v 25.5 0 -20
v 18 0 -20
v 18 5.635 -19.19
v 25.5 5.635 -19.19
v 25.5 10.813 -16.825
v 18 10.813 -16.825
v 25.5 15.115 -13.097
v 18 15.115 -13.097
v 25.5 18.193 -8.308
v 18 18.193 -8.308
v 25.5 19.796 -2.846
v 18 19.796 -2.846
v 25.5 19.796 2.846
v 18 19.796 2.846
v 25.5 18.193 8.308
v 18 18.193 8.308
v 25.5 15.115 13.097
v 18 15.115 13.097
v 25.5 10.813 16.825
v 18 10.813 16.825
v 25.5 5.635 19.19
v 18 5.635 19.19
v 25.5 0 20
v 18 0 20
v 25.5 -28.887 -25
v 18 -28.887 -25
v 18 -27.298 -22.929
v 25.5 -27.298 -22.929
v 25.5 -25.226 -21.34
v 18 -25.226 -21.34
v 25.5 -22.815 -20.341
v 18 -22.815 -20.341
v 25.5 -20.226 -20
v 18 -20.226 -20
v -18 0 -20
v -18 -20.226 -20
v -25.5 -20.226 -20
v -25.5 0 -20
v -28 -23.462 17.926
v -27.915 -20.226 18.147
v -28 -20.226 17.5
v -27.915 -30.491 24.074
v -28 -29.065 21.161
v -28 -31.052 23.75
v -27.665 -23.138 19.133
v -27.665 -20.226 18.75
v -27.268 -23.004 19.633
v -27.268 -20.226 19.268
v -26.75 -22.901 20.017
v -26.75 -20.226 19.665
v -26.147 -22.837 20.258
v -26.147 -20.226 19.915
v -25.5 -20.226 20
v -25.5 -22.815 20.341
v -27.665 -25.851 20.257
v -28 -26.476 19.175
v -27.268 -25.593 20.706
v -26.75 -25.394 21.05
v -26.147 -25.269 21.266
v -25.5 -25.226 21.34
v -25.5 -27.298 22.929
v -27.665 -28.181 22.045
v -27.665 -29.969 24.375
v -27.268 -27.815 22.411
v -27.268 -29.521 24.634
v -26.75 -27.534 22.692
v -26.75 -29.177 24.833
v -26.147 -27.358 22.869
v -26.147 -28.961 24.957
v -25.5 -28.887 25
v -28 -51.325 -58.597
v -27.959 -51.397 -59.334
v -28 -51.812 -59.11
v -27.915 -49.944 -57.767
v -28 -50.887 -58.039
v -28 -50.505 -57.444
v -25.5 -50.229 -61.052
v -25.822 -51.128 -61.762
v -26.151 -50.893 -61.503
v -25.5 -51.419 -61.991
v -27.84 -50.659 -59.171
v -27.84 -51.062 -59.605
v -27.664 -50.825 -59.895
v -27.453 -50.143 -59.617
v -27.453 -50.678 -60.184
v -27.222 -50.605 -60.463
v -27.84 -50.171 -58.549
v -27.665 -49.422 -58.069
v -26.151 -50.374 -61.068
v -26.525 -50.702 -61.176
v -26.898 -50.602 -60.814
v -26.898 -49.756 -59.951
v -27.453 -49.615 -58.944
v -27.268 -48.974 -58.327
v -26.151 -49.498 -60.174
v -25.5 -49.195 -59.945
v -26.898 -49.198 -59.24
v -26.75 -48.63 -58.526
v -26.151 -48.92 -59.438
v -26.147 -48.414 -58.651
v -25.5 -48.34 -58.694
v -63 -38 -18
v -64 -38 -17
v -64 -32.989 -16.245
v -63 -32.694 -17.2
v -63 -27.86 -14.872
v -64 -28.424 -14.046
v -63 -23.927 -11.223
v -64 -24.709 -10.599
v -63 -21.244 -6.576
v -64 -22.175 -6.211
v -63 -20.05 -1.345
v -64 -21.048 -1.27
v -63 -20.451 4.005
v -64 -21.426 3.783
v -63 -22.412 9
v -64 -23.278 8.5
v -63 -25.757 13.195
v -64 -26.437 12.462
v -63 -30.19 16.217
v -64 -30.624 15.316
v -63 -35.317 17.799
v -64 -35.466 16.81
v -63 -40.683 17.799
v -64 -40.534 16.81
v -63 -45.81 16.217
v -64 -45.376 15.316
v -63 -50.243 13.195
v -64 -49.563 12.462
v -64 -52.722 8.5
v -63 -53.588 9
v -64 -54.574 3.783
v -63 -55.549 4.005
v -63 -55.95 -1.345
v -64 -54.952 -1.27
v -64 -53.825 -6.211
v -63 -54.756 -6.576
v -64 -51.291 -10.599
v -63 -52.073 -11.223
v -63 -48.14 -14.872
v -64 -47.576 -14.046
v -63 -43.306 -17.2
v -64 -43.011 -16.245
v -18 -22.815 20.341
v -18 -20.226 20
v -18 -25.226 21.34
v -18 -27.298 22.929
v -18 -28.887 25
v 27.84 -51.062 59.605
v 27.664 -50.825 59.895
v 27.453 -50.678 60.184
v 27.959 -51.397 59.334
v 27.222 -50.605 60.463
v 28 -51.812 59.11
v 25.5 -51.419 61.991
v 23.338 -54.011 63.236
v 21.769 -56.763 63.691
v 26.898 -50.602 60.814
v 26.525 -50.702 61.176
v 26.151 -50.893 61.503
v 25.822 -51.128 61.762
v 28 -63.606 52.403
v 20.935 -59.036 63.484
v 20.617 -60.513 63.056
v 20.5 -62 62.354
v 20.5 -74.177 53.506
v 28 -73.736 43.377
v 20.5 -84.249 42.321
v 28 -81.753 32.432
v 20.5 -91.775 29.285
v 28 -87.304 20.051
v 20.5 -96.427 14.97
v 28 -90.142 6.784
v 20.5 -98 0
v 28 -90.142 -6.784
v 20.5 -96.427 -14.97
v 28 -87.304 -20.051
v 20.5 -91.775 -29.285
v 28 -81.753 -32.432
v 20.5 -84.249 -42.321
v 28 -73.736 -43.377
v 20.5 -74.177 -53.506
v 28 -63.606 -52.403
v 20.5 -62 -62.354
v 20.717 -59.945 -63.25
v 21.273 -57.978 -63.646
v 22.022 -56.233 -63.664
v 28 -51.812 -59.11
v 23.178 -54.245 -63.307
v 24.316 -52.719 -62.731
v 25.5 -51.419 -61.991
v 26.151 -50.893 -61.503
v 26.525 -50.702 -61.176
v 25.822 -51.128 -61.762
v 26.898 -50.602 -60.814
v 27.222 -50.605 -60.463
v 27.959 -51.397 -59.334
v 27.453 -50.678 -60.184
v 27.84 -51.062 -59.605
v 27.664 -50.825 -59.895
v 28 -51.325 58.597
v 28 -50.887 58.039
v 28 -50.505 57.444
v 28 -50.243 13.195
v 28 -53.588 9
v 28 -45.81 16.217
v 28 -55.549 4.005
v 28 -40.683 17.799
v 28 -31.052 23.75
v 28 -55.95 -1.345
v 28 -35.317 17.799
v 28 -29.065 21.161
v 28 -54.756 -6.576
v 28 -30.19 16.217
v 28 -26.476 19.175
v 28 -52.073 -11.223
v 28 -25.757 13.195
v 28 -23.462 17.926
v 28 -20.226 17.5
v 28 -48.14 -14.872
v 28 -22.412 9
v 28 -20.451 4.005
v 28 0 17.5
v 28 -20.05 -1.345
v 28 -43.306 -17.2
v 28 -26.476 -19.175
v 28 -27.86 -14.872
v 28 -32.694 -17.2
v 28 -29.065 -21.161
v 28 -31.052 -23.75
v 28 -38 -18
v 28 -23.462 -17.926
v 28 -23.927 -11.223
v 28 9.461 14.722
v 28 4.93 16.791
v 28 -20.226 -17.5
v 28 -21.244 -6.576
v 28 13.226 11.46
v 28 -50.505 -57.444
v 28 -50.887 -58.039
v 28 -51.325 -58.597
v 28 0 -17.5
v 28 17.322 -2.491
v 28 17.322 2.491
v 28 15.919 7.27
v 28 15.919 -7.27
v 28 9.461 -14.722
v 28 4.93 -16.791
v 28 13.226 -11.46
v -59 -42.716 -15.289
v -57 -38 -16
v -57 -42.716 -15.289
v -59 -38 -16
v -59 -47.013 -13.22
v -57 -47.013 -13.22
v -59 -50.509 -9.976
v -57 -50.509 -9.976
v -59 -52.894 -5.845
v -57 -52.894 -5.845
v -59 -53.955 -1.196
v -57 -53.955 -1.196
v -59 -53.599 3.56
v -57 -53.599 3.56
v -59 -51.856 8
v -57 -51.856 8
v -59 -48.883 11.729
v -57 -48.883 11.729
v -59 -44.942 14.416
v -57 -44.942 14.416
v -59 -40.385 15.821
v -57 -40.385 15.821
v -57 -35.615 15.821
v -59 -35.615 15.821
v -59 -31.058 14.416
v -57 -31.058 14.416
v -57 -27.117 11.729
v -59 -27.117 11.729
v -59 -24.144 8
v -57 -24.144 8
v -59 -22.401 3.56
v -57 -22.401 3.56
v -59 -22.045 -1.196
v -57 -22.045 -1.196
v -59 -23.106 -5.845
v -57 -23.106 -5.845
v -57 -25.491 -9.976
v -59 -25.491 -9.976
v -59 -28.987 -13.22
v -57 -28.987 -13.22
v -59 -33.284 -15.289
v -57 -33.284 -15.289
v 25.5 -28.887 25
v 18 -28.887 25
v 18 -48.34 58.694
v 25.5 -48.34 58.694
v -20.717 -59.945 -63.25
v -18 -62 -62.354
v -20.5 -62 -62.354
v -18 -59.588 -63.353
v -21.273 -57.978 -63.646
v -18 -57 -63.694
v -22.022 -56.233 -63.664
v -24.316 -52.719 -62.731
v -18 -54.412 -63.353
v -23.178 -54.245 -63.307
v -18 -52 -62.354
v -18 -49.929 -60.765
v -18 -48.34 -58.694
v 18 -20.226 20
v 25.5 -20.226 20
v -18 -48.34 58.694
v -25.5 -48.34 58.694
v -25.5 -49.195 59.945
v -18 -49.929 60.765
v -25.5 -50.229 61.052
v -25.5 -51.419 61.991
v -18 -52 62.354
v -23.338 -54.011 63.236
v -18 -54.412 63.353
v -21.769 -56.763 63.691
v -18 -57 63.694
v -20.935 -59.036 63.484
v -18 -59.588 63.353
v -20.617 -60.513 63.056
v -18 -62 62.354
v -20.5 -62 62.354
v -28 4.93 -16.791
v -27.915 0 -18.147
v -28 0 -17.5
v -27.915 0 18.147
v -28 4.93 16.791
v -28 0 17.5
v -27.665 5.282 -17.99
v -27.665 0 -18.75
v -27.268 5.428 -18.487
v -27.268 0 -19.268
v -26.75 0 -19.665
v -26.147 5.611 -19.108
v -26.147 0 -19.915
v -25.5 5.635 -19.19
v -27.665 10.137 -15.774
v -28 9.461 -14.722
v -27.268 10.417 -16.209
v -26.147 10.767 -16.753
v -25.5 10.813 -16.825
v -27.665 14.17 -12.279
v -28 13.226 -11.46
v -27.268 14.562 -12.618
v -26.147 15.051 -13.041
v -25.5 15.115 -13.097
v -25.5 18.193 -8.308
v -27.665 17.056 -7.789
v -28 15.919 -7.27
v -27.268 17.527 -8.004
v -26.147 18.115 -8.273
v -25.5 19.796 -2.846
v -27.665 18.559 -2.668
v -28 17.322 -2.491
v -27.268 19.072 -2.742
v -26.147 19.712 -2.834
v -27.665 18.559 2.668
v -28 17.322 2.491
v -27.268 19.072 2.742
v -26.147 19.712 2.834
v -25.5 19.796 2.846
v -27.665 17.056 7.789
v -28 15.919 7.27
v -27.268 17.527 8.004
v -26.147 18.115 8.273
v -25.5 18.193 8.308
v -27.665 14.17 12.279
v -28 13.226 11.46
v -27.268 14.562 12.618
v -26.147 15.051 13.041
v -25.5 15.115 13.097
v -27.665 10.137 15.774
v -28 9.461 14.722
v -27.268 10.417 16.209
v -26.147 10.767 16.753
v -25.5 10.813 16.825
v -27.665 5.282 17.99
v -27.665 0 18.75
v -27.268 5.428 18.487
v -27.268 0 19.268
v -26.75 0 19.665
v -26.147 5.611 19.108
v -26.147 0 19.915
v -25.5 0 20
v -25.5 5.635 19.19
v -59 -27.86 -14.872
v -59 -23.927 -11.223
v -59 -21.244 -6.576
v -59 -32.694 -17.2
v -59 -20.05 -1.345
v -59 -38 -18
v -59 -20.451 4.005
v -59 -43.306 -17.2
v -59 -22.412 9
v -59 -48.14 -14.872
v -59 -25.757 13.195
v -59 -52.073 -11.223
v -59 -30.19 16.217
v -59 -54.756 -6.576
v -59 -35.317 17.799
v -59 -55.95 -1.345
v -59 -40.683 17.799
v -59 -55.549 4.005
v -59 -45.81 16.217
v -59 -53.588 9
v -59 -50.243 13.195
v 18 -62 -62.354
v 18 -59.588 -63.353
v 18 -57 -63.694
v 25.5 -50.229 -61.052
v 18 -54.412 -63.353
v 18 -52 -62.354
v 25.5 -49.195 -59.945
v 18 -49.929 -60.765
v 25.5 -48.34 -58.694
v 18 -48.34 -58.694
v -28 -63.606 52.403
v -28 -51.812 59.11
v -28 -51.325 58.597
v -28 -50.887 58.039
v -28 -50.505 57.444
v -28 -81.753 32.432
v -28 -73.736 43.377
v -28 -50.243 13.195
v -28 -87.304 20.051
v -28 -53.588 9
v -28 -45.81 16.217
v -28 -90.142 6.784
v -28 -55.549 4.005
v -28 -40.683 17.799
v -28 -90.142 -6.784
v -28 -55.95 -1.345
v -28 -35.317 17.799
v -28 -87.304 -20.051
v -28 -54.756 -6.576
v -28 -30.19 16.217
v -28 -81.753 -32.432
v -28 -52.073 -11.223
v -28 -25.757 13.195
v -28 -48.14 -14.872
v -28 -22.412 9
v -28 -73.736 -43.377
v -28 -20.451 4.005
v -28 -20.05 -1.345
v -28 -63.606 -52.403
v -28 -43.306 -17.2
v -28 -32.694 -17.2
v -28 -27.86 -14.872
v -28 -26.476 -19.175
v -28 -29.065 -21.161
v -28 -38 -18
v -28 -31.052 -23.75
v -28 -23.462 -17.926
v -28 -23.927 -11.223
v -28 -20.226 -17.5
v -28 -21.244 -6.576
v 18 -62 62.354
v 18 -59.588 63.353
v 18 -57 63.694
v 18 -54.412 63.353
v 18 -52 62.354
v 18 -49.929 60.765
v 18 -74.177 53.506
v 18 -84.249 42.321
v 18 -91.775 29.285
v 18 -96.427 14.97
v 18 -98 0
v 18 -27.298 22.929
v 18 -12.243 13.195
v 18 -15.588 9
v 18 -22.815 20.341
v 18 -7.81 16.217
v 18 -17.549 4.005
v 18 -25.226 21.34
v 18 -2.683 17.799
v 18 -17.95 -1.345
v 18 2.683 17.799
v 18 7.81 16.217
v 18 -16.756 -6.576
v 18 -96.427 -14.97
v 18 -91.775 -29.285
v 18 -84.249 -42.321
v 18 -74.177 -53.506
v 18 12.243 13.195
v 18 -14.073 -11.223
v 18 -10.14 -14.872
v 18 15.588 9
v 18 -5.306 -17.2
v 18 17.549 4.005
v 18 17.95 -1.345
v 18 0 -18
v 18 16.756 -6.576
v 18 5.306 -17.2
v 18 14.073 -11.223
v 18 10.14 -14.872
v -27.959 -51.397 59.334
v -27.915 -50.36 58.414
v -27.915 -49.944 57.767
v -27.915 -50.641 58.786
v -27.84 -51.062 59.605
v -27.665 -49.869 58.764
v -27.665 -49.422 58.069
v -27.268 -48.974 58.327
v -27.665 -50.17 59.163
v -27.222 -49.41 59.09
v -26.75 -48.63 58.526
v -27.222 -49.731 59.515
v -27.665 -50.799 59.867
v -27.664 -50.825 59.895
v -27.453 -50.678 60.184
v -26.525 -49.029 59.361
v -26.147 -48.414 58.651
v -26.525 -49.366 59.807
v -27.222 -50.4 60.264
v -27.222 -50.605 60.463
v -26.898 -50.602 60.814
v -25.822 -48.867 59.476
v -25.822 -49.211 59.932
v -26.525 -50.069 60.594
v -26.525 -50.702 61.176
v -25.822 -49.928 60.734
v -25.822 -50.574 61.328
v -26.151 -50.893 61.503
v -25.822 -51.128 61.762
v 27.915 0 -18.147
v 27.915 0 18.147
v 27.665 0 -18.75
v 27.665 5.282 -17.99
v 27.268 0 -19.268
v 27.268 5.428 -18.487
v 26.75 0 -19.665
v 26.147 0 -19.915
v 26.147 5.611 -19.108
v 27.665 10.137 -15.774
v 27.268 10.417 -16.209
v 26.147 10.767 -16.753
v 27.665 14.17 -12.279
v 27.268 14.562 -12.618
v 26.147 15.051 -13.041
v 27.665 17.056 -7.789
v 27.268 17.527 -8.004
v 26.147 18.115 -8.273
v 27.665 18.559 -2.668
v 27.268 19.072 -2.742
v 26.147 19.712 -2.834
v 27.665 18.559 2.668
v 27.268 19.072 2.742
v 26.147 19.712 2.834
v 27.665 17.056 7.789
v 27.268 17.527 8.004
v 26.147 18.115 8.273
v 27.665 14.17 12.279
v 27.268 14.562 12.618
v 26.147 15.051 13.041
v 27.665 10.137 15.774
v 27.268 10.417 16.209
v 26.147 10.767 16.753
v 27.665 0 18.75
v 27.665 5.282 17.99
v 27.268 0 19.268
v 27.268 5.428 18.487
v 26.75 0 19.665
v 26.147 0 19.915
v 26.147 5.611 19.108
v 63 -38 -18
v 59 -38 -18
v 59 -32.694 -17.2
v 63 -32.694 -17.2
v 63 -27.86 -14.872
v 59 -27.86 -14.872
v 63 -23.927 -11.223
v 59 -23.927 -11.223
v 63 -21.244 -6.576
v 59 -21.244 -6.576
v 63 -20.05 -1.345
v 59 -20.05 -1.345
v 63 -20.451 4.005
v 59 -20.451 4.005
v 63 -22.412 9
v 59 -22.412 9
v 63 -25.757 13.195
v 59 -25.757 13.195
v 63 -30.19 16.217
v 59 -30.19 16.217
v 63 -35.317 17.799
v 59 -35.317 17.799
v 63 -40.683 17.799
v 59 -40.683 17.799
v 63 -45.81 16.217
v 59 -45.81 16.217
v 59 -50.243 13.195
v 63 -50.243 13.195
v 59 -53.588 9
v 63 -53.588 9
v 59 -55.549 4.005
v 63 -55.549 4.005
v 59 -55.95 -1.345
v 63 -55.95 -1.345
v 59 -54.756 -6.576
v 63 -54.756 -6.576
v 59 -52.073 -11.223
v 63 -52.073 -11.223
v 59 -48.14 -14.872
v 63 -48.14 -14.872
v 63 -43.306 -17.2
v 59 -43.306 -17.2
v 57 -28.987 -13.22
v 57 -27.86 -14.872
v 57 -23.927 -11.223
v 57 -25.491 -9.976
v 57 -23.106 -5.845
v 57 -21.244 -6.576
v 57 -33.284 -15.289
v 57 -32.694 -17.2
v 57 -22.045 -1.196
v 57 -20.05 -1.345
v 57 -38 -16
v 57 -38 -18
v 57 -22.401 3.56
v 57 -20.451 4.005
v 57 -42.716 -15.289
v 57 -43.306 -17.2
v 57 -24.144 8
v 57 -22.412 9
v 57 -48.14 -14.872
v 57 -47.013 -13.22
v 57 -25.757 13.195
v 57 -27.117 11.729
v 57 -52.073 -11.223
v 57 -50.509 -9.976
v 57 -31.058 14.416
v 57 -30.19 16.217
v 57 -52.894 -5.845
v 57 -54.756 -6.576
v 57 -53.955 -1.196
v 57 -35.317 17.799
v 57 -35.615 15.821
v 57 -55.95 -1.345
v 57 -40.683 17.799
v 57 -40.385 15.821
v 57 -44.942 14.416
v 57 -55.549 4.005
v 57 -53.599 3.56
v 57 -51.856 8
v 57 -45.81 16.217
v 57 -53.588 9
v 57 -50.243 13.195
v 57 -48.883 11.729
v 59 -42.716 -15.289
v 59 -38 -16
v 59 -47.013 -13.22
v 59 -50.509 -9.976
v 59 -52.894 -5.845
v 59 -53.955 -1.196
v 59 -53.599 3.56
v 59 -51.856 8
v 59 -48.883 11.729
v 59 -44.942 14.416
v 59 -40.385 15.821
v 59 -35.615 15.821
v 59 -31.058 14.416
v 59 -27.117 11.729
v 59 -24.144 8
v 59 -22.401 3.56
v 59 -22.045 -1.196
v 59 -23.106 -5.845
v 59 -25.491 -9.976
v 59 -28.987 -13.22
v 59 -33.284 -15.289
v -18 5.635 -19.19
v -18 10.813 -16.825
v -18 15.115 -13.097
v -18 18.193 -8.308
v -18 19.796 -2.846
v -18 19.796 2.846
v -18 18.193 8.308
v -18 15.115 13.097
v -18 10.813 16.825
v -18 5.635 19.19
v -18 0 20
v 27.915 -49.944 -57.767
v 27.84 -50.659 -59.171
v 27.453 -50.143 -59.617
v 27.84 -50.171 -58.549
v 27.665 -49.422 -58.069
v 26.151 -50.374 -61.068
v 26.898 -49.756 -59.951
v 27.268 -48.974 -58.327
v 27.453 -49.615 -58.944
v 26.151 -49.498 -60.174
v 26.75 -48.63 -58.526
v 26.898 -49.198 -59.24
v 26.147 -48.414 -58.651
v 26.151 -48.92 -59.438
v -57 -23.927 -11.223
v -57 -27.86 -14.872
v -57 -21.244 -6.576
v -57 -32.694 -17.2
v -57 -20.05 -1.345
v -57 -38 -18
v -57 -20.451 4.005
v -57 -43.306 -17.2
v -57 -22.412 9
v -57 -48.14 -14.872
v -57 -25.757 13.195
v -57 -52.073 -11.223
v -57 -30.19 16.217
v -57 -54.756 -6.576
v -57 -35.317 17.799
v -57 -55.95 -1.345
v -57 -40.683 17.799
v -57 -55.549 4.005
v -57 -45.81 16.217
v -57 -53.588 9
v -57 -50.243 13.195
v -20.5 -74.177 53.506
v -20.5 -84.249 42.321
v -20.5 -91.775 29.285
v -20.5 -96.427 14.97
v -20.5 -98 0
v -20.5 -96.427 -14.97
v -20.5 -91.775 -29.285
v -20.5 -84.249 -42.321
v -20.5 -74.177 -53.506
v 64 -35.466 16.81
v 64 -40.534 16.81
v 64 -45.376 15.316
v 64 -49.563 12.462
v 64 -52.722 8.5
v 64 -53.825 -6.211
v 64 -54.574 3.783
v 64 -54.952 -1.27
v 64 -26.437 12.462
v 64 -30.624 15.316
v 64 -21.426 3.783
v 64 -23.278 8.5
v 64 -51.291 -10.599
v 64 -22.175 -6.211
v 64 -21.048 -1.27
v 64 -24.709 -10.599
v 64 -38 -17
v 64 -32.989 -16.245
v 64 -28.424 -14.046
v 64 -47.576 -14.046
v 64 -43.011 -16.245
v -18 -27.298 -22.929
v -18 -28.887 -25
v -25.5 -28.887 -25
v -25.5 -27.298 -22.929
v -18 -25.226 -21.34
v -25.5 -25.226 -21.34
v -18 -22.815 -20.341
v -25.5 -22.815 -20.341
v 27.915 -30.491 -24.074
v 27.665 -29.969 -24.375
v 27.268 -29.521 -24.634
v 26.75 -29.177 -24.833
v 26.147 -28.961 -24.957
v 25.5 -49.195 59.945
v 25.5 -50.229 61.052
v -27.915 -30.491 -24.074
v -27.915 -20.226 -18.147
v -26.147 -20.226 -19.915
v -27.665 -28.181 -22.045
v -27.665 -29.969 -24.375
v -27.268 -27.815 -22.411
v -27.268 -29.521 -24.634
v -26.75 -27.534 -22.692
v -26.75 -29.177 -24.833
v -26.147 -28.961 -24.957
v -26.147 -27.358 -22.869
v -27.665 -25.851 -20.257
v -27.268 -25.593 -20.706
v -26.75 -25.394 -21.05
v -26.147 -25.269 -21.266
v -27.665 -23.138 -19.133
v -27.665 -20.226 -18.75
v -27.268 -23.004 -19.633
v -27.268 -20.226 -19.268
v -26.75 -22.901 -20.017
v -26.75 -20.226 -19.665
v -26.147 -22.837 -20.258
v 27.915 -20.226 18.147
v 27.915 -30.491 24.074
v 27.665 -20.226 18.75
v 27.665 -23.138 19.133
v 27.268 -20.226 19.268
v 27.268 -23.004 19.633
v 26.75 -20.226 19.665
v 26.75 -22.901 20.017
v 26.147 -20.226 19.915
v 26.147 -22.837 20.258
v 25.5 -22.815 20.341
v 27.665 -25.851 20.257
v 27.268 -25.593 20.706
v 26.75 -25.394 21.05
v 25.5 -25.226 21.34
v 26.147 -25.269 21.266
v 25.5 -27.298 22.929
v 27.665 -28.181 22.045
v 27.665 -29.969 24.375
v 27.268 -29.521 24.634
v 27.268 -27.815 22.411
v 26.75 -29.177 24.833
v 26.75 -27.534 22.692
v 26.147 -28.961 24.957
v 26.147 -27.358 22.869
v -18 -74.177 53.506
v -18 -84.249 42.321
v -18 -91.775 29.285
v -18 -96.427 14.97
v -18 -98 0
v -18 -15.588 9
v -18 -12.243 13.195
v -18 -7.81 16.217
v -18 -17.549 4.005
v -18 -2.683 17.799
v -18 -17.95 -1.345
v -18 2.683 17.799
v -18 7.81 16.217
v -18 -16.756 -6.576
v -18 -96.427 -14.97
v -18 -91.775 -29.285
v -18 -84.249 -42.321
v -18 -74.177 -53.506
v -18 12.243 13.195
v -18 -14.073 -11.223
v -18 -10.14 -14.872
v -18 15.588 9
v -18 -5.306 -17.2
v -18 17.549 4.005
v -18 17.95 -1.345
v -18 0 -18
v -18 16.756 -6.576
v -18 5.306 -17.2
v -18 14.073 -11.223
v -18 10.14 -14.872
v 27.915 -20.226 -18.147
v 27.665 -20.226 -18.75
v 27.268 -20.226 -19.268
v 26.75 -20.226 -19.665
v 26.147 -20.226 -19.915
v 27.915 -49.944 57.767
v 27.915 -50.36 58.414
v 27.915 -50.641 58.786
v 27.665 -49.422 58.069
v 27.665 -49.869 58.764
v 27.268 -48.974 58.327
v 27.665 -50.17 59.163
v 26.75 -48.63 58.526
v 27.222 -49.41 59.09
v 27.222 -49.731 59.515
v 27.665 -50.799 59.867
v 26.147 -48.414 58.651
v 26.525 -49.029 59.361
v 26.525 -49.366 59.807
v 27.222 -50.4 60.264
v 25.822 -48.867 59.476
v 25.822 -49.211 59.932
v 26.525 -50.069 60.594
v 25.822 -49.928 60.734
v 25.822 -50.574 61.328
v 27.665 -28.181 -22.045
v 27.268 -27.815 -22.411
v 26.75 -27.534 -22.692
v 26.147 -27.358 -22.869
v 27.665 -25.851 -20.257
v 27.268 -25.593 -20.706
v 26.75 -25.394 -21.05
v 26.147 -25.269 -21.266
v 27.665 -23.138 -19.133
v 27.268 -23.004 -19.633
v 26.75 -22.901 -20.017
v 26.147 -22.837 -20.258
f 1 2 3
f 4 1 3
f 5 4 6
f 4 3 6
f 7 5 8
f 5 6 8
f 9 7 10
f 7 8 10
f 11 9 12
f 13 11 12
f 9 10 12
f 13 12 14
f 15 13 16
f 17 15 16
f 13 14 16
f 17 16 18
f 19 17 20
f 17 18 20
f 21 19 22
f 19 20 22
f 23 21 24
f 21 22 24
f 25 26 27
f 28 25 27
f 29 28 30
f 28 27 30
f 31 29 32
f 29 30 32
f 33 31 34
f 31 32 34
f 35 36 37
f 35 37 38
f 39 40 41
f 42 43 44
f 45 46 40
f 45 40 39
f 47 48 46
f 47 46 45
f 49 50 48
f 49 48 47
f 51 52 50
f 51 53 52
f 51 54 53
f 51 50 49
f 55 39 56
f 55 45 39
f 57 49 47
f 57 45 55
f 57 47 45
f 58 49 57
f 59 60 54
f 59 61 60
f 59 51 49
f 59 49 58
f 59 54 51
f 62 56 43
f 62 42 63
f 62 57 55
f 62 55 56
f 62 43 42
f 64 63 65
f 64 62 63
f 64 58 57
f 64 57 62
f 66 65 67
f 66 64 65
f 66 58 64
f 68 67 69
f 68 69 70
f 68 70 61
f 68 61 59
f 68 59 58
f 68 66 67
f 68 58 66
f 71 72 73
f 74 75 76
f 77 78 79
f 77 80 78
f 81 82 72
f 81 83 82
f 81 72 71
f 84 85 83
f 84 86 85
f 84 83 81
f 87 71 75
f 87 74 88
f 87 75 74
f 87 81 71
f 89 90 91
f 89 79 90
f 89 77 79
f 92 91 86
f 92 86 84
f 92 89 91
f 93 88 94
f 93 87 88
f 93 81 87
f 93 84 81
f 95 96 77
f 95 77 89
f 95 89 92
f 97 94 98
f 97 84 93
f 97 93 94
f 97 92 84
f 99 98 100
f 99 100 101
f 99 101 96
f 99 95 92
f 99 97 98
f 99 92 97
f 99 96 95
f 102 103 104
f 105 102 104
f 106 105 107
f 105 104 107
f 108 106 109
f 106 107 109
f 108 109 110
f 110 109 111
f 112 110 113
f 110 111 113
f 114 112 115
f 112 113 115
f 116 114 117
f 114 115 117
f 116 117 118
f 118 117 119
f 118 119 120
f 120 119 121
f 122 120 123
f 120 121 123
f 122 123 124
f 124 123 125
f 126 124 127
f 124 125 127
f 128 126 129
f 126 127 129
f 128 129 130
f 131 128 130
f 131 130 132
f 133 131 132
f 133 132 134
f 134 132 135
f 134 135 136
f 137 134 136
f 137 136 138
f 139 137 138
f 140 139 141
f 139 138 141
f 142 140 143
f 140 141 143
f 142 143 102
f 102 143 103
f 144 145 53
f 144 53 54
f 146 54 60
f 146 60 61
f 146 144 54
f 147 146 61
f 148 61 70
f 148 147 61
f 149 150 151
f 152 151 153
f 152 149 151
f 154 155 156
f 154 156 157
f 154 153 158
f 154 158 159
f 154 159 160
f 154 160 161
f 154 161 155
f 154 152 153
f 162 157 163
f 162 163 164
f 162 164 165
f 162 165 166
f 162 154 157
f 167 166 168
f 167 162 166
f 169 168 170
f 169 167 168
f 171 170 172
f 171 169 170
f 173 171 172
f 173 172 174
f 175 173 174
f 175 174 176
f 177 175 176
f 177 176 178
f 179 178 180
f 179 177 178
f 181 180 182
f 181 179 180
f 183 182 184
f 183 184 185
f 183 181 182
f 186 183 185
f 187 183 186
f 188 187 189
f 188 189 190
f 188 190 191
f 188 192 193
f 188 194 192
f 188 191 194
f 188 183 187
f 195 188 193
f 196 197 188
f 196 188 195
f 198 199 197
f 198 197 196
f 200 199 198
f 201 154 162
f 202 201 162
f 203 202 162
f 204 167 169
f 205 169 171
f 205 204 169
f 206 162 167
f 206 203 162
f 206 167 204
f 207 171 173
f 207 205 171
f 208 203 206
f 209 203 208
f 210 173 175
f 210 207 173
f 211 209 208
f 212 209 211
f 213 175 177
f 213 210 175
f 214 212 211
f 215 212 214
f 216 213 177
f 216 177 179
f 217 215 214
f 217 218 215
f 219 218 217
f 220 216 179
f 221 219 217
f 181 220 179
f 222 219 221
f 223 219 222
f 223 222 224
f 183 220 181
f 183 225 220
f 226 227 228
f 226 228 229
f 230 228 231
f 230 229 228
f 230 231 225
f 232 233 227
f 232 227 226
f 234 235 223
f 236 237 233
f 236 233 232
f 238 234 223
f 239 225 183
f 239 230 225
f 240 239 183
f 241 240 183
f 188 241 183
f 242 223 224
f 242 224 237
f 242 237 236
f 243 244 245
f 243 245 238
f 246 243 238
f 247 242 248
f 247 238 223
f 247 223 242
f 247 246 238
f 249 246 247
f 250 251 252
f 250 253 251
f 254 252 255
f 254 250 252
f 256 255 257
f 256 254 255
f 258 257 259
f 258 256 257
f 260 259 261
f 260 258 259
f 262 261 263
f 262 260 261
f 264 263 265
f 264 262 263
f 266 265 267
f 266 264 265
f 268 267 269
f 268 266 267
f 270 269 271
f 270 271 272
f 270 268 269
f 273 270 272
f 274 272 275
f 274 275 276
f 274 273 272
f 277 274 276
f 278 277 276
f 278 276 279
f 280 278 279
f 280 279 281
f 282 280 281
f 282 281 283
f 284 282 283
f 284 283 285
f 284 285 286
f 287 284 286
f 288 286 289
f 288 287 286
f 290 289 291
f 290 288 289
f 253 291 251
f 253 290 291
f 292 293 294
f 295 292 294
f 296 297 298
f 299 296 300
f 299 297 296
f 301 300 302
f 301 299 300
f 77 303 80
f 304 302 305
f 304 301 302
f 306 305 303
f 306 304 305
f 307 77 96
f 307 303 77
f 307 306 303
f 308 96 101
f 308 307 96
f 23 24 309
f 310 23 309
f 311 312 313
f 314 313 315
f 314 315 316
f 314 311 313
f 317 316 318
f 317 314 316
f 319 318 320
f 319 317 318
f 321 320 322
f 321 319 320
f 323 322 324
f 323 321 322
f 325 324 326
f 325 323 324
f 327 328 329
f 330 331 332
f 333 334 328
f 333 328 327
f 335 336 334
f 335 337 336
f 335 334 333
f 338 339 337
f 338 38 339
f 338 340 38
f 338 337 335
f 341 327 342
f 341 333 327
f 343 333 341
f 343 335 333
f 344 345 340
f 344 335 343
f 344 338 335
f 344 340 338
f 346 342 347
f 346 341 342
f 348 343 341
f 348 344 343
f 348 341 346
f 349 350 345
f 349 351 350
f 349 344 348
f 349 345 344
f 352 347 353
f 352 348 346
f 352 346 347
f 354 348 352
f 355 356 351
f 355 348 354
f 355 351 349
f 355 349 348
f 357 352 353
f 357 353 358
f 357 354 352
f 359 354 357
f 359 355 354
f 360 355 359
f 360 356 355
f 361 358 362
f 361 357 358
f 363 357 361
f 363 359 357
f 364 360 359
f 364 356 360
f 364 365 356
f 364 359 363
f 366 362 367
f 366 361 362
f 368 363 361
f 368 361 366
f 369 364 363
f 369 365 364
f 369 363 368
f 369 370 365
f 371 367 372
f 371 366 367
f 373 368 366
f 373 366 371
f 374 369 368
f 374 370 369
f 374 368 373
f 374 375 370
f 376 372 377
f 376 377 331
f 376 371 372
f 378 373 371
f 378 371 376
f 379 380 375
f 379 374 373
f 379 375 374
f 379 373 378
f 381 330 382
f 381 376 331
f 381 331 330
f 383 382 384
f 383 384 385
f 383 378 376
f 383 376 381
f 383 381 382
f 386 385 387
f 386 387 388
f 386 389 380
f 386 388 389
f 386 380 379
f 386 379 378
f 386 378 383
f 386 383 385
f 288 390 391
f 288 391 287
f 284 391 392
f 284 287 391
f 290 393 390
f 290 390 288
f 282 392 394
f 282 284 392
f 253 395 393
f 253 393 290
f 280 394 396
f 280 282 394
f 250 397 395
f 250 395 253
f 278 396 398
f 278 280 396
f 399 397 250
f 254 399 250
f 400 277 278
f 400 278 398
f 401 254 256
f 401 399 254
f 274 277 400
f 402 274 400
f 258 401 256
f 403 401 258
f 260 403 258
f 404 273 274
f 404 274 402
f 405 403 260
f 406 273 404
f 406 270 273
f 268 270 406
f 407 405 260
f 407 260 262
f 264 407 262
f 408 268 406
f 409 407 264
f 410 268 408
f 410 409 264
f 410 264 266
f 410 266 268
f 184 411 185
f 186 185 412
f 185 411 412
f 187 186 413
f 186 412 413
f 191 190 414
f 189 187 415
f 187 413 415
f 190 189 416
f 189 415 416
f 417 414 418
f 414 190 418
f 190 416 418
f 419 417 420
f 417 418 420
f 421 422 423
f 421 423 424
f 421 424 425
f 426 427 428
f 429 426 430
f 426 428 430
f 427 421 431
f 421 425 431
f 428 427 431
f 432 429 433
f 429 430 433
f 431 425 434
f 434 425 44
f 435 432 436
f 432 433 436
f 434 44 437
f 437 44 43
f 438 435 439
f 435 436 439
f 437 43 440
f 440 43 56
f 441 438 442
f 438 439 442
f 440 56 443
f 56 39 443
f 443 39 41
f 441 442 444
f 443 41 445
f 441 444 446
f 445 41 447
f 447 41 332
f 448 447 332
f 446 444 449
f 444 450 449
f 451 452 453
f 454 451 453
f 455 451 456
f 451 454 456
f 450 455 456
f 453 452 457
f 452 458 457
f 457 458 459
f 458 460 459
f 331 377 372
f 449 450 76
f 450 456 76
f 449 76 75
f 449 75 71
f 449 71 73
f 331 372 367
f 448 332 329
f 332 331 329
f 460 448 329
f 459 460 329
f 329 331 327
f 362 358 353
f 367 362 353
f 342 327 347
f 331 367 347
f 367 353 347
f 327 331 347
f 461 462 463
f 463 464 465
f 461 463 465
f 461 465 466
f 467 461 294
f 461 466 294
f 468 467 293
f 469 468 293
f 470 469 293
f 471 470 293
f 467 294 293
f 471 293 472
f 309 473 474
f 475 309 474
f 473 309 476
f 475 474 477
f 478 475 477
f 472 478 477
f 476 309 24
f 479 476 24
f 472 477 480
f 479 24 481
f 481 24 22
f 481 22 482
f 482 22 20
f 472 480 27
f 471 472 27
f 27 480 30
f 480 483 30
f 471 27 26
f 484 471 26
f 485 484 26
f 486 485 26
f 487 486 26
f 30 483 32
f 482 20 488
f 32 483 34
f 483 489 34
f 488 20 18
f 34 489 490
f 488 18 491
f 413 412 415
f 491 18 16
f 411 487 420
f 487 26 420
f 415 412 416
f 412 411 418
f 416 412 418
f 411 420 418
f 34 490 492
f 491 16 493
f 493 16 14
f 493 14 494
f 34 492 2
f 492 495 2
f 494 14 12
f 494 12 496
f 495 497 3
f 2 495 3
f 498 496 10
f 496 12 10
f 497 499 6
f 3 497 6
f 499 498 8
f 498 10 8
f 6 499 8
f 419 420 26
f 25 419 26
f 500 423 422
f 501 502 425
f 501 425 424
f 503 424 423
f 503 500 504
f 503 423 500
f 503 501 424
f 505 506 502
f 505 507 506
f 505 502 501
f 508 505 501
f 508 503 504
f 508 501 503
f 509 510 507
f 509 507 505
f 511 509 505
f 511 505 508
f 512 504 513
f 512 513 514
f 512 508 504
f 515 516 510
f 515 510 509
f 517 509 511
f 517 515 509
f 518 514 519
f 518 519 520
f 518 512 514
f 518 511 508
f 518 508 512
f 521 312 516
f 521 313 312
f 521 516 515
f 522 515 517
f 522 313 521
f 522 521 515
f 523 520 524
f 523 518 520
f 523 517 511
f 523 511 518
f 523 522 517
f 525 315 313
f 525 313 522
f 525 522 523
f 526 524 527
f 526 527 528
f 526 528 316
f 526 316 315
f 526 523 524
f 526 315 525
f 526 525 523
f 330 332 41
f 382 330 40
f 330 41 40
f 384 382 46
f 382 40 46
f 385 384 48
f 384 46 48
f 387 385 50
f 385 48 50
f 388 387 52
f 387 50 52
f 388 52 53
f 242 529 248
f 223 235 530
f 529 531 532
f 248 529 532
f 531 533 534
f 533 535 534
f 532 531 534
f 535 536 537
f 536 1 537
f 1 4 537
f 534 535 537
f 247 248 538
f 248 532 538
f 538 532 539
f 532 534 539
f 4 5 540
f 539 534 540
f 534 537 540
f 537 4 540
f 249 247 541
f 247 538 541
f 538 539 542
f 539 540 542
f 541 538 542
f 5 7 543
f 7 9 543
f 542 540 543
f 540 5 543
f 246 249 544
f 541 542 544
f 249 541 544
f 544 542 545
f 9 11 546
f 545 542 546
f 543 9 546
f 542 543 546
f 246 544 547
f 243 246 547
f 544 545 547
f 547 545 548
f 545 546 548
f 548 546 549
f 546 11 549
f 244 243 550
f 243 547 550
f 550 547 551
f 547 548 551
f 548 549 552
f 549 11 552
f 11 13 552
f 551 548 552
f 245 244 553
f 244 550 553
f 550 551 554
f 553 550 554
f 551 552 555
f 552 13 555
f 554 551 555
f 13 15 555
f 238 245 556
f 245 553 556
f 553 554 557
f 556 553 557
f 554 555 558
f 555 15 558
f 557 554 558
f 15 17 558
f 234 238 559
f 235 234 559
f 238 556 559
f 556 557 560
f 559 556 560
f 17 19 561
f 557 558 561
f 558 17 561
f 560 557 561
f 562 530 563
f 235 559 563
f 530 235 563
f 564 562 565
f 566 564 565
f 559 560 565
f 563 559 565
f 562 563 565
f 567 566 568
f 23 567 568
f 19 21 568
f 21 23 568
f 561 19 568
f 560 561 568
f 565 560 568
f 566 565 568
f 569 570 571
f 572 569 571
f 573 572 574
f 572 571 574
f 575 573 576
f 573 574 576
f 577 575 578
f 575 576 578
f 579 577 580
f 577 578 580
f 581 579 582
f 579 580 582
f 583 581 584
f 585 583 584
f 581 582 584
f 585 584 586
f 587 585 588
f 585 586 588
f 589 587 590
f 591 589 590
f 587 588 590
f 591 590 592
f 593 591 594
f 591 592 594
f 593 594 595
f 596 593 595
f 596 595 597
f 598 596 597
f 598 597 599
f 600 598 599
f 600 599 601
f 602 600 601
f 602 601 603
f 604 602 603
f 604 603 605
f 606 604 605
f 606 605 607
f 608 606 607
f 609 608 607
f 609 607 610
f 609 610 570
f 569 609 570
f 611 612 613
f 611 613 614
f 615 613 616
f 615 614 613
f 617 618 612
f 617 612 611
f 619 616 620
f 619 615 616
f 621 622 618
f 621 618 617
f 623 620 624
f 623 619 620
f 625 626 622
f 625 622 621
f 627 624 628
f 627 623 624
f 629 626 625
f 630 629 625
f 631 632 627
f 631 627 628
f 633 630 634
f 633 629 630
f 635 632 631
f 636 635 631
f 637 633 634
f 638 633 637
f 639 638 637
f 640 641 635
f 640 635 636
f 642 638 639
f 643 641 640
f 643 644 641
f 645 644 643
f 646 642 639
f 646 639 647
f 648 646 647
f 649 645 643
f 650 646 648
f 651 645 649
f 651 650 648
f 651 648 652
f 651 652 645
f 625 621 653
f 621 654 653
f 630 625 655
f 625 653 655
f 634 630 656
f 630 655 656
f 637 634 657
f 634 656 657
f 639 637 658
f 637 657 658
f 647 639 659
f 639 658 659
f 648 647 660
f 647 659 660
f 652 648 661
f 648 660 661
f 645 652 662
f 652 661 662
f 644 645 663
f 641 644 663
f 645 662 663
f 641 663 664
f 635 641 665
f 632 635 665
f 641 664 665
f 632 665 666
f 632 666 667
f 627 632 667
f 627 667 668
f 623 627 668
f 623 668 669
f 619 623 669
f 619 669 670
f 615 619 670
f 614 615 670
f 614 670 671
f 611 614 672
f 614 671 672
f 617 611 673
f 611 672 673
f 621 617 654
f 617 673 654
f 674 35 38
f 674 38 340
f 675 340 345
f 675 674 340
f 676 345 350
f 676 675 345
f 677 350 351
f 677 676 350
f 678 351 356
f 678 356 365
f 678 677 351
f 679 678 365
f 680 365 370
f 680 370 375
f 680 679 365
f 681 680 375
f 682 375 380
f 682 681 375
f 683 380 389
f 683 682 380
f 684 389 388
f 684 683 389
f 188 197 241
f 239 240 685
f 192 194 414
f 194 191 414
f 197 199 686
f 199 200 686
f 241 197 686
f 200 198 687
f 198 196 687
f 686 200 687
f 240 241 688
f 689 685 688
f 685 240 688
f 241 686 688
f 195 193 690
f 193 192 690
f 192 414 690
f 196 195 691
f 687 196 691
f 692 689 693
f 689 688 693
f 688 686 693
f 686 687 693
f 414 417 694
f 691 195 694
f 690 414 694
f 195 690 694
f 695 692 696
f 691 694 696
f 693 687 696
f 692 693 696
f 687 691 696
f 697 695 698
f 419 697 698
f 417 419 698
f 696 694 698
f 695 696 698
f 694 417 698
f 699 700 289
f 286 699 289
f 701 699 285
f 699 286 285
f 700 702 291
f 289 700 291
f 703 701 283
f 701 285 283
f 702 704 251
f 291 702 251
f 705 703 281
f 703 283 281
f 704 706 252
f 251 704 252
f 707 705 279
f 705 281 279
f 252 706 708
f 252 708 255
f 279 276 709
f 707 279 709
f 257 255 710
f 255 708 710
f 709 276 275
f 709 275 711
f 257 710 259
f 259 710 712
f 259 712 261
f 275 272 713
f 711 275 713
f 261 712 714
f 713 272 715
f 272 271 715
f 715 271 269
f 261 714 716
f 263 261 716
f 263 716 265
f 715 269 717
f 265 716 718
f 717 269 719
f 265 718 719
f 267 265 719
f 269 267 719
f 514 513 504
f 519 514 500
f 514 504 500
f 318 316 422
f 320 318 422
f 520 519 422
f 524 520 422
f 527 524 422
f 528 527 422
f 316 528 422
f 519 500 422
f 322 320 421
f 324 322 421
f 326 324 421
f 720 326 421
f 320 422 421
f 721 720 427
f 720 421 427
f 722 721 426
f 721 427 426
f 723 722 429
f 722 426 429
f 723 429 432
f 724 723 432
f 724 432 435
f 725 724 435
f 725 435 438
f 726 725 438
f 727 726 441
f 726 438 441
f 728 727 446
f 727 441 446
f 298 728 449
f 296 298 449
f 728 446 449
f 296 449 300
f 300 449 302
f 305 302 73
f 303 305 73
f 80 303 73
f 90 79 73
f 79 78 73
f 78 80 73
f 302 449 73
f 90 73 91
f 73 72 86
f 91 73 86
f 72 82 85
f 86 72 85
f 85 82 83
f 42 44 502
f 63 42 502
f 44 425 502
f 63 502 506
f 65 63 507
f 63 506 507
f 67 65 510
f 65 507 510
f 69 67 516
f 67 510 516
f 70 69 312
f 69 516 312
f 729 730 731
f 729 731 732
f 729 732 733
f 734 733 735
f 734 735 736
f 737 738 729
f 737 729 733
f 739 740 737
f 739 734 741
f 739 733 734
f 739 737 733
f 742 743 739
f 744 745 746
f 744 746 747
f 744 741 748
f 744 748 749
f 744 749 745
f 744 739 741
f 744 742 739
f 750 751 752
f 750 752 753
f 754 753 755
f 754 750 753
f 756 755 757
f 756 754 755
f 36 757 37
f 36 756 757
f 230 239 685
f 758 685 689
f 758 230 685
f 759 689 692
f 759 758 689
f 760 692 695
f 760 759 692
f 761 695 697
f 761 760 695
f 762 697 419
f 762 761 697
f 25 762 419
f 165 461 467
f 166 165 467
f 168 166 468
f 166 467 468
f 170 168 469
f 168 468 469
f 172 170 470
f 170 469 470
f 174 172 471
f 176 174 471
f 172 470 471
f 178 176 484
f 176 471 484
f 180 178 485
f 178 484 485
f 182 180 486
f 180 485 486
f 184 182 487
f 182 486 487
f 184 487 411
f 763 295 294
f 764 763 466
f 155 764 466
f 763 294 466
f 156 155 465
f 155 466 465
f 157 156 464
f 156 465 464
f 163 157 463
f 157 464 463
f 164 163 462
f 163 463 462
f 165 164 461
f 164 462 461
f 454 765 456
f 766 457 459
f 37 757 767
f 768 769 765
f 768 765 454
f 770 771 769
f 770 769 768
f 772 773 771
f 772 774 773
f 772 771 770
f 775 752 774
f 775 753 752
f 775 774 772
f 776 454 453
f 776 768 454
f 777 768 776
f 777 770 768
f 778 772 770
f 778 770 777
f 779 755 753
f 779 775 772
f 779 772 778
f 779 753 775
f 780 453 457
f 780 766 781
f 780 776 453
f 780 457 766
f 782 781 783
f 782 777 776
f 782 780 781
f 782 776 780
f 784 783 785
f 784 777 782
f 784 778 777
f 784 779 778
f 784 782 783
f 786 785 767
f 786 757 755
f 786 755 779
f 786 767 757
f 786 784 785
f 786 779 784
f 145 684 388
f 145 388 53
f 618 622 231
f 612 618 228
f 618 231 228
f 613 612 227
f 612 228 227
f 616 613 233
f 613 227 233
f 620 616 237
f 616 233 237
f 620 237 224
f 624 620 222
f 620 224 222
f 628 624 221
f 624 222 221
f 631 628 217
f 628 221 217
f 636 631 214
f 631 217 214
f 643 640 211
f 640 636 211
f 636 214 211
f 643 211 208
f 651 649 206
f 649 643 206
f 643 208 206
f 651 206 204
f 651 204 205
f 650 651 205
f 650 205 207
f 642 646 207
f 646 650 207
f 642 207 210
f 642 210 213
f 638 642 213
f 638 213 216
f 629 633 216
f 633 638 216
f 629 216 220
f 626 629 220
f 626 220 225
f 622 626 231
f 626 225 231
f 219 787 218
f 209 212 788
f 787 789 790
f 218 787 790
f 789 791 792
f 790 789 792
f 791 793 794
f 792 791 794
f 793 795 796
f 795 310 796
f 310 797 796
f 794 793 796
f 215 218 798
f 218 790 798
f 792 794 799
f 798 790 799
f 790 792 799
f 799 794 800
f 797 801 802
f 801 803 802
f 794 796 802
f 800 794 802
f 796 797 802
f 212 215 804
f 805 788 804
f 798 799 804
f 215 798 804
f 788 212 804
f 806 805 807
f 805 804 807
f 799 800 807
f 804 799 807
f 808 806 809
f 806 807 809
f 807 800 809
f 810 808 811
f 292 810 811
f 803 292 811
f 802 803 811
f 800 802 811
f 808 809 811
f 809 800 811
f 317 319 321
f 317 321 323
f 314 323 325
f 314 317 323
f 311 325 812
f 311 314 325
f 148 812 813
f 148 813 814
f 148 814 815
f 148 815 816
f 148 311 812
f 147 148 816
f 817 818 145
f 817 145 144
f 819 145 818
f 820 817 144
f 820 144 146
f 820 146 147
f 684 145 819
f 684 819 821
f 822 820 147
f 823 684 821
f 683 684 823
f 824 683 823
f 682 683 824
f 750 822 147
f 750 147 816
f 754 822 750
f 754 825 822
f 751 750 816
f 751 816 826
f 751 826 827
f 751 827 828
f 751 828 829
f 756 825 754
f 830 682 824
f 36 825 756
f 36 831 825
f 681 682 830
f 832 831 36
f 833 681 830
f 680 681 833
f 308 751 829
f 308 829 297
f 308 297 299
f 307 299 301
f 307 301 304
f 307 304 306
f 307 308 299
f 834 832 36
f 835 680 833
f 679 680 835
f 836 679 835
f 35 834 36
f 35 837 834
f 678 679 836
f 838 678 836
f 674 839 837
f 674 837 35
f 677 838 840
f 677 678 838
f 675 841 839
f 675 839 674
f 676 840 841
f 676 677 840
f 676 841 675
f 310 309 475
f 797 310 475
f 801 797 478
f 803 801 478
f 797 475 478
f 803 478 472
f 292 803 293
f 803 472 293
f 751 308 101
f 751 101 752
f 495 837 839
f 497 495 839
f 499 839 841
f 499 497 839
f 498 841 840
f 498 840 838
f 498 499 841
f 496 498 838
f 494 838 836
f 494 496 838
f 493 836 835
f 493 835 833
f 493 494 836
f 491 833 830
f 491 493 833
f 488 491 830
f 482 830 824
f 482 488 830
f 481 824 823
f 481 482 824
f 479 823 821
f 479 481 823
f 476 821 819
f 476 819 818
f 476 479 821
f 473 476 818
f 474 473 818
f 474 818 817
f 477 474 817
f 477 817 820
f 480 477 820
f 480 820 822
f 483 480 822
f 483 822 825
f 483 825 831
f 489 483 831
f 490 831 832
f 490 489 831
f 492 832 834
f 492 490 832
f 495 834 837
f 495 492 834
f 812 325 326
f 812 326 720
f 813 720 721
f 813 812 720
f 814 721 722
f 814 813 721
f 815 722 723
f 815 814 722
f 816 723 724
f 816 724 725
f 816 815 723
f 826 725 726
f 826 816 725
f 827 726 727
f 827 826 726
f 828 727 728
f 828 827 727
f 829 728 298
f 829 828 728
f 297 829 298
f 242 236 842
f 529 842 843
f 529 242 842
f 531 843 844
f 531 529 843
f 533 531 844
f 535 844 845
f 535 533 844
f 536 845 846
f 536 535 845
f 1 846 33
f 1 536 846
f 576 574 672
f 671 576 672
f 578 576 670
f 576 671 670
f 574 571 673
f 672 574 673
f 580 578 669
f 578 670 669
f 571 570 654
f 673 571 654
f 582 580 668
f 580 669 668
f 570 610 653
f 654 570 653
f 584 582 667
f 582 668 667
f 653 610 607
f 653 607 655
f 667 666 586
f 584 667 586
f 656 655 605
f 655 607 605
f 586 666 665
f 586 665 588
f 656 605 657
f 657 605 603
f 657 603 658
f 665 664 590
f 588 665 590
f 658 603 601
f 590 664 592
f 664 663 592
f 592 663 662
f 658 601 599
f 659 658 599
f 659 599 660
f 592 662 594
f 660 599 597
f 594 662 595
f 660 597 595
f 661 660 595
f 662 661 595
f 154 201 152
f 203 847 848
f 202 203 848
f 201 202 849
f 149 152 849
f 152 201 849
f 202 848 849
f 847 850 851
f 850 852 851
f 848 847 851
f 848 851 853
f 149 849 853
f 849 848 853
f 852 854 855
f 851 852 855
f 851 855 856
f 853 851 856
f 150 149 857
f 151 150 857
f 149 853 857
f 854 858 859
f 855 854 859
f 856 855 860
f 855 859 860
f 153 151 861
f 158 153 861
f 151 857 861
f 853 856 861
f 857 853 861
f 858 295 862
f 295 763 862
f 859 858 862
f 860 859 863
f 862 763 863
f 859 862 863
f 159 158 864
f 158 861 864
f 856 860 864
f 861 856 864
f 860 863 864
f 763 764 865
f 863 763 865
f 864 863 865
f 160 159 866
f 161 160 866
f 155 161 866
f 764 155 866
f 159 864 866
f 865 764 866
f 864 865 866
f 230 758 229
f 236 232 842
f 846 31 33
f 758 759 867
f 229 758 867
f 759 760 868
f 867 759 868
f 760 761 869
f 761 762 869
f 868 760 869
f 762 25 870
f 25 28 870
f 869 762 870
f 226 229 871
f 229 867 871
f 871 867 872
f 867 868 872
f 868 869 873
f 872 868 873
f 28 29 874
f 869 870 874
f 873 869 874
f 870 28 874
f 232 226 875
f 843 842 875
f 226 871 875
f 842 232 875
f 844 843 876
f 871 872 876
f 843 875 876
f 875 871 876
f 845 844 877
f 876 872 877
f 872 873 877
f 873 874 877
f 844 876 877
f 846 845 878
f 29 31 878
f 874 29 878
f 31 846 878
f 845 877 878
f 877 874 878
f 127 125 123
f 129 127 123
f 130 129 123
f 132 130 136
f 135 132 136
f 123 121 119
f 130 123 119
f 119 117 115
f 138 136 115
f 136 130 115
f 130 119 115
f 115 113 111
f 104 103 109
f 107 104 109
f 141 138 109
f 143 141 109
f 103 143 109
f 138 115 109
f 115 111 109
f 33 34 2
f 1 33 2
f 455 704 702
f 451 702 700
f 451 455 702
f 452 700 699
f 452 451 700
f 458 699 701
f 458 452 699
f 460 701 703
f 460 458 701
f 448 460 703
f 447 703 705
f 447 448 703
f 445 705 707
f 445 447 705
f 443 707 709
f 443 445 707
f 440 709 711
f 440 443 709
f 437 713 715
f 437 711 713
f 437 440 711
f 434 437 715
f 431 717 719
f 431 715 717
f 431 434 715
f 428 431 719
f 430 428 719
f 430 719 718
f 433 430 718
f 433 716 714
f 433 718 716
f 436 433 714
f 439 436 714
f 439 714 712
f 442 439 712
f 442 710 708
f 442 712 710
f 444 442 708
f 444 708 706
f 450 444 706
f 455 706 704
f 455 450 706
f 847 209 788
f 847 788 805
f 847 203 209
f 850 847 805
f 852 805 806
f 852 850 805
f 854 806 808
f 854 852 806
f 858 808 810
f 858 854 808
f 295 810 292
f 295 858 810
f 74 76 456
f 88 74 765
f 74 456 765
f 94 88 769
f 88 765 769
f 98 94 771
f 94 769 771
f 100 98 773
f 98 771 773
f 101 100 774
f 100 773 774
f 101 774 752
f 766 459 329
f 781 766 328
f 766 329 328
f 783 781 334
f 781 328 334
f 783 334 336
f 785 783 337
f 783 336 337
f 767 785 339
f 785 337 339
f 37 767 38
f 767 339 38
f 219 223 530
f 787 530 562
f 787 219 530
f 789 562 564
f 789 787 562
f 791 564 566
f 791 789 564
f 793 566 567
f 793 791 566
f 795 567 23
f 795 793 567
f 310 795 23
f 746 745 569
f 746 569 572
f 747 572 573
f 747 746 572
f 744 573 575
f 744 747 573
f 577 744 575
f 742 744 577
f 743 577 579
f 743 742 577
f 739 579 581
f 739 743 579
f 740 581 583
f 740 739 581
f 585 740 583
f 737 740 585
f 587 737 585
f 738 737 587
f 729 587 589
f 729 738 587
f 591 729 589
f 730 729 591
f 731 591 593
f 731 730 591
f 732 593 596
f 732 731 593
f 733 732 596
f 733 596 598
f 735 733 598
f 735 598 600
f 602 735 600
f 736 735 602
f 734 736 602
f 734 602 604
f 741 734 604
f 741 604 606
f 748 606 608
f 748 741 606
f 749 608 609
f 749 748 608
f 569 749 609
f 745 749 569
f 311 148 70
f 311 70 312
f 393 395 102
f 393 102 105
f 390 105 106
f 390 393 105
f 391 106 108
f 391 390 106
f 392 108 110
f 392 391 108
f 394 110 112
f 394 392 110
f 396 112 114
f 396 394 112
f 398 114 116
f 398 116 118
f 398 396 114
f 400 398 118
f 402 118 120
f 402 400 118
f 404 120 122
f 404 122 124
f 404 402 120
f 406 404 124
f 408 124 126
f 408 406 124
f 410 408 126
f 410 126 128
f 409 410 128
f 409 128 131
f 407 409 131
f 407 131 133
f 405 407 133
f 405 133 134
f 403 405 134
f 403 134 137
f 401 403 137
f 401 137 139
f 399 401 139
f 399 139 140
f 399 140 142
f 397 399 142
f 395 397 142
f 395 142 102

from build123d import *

# Parameters (mm, degrees)
BOSS_EXTRUDE1_DEPTH      = 10
CHAMFER1_SIZE            = 7.5
FILLET1_R                = 2.5
BOSS_EXTRUDE2_DEPTH      = 10
CHAMFER2_SIZE            = 7.5
FILLET2_R                = 2.5
SKETCH3_R                = 18
BOSS_EXTRUDE3_DEPTH      = 18
SKETCH4_R                = 18
BOSS_EXTRUDE4_DEPTH      = 36
SKETCH5_W                = 2
SKETCH5_H                = 2
CHAMFER3_SIZE            = 1
CHAMFER3_OF_MIRROR1_SIZE = 1


with BuildPart() as part:
    # Sketch1 → Boss-Extrude1 (new body)
    with BuildSketch(Plane(origin=(18, 0, 0), x_dir=(0, 0, -1), z_dir=(1, 0, 0))):
        with BuildLine():
            Line((-25, -28.886751346), (-58.693575035, -48.339745962))
            ThreePointArc((-58.693575035, -48.339745962), (-63.352833298, -54.411809549), (-62.353829072, -62))
            ThreePointArc((-62.353829072, -62), (0, -98), (62.353829072, -62))
            ThreePointArc((62.353829072, -62), (63.352833298, -54.411809549), (58.693575035, -48.339745962))
            Line((58.693575035, -48.339745962), (25, -28.886751346))
            ThreePointArc((25, -28.886751346), (21.339745962, -25.226497308), (20, -20.226497308))
            Line((20, -20.226497308), (20, 0))
            ThreePointArc((20, 0), (0, 20), (-20, 0))
            Line((-20, 0), (-20, -20.226497308))
            ThreePointArc((-20, -20.226497308), (-21.339745962, -25.226497308), (-25, -28.886751346))
        make_face()
    extrude(amount=BOSS_EXTRUDE1_DEPTH)

    # Chamfer1
    # the kernel refuses this chamfer: 7.5 mm, written as the material it takes off along each edge
    with BuildSketch(Plane(origin=(28, -26, 0), x_dir=(0, -0.2527522173180771, 0.9675310416936479), z_dir=(0, 0.9675310416936479, 0.2527522173180771))) as chamfer1_piece_1:
        Polygon((72, -CHAMFER1_SIZE), (72 - CHAMFER1_SIZE, 0), (72, 0), align=None)
    revolve(axis=Axis((28, -26, 0), (1, 0, 0)), revolution_arc=150.719131607, mode=Mode.SUBTRACT)

    # Fillet1
    fillet1_edges = [part.edges().sort_by_distance(p)[0] for p in [
        (28, -48.810655601, -59.432445857),
        (28, -38.613248654, -41.846787517),
        (28, -25.226497308, -21.339745962),
        (28, -10.113248654, -20),
        (28, -48.810655601, 59.432445857),
        (28, -38.613248654, 41.846787517),
        (28, -25.226497308, 21.339745962),
        (28, -10.113248654, 20),
        (28, 20, 0),
    ]]
    fillet(fillet1_edges, radius=FILLET1_R)



with BuildPart() as body_2:
    # Sketch2 → Boss-Extrude2 (new body)
    with BuildSketch(Plane(origin=(-18, 0, 0), x_dir=(0, 0, -1), z_dir=(1, 0, 0))):
        with BuildLine():
            Line((20, -20.226497308), (20, 0))
            ThreePointArc((20, 0), (0, 20), (-20, 0))
            Line((-20, 0), (-20, -20.226497308))
            ThreePointArc((-20, -20.226497308), (-21.339745962, -25.226497308), (-25, -28.886751346))
            Line((-25, -28.886751346), (-58.693575035, -48.339745962))
            ThreePointArc((-58.693575035, -48.339745962), (-63.352833298, -54.411809549), (-62.353829072, -62))
            ThreePointArc((-62.353829072, -62), (0, -98), (62.353829072, -62))
            ThreePointArc((62.353829072, -62), (63.352833298, -54.411809549), (58.693575035, -48.339745962))
            Line((58.693575035, -48.339745962), (25, -28.886751346))
            ThreePointArc((25, -28.886751346), (21.339745962, -25.226497308), (20, -20.226497308))
        make_face()
    extrude(amount=-BOSS_EXTRUDE2_DEPTH)

    # Chamfer2
    # the kernel refuses this chamfer: 7.5 mm, written as the material it takes off along each edge
    with BuildSketch(Plane(origin=(-28, -26, 0), x_dir=(0, -0.25275221731807723, 0.9675310416936479), z_dir=(0, 0.9675310416936479, 0.25275221731807723))) as chamfer2_piece_1:
        Polygon((72, CHAMFER2_SIZE), (72 - CHAMFER2_SIZE, 0), (72, 0), align=None)
    revolve(axis=Axis((-28, -26, 0), (1, 0, 0)), revolution_arc=150.719131607, mode=Mode.SUBTRACT)

    # Fillet2
    fillet2_edges = [body_2.edges().sort_by_distance(p)[0] for p in [
        (-28, -48.810655601, -59.432445857),
        (-28, -38.613248654, -41.846787517),
        (-28, -25.226497308, -21.339745962),
        (-28, -10.113248654, -20),
        (-28, -48.810655601, 59.432445857),
        (-28, -38.613248654, 41.846787517),
        (-28, -25.226497308, 21.339745962),
        (-28, -10.113248654, 20),
        (-28, 20, 0),
    ]]
    fillet(fillet2_edges, radius=FILLET2_R)


with BuildPart() as part_1:
    add(part.part)

    add(body_2.part)  # Boss-Extrude3 merges body 2
    # Sketch3 → Boss-Extrude3 (add, symmetric)
    with BuildSketch(Plane(origin=(0, 0, 0), x_dir=(0, 0, -1), z_dir=(1, 0, 0))):
        Circle(SKETCH3_R)
    extrude(amount=BOSS_EXTRUDE3_DEPTH, both=True)

    # Sketch4 → Boss-Extrude4 (add)
    with BuildSketch(Plane(origin=(28, 0, 0), x_dir=(0, 0, -1), z_dir=(1, 0, 0))):
        with Locations((0, -38)):
            Circle(SKETCH4_R)
    boss_extrude4 = extrude(amount=BOSS_EXTRUDE4_DEPTH)

    # Sketch5 → Cut-Revolve1 (revolve, cut)
    with BuildSketch(Plane.XY, mode=Mode.PRIVATE) as cut_revolve1_sk:
        with Locations((58, -21)):
            Rectangle(SKETCH5_W, SKETCH5_H)
    cut_revolve1 = revolve(cut_revolve1_sk.sketch.rotate(Axis((64, -38, 0), (-1, 0, 0)), 90), axis=Axis((64, -38, 0), (-1, 0, 0)), mode=Mode.SUBTRACT)

    # Chamfer3
    chamfer3_edges = [part_1.edges().sort_by_distance(p)[0] for p in [
        (64, -38, 18),
    ]]
    chamfer(chamfer3_edges, length=CHAMFER3_SIZE)

    # Mirror1: Boss-Extrude4, Cut-Revolve1 across plane
    add(boss_extrude4.mirror(Plane(origin=(0, 0, 0), x_dir=(0, 0, 1), z_dir=(1, 0, 0))))
    add(cut_revolve1.mirror(Plane(origin=(0, 0, 0), x_dir=(0, 0, 1), z_dir=(1, 0, 0))), mode=Mode.SUBTRACT)

    # Chamfer3 of Mirror1
    chamfer3_of_mirror1_edges = [part_1.edges().sort_by_distance(p)[0] for p in [
        (-64, -38, 18),
    ]]
    chamfer(chamfer3_of_mirror1_edges, length=CHAMFER3_OF_MIRROR1_SIZE)


solid = part_1.part
